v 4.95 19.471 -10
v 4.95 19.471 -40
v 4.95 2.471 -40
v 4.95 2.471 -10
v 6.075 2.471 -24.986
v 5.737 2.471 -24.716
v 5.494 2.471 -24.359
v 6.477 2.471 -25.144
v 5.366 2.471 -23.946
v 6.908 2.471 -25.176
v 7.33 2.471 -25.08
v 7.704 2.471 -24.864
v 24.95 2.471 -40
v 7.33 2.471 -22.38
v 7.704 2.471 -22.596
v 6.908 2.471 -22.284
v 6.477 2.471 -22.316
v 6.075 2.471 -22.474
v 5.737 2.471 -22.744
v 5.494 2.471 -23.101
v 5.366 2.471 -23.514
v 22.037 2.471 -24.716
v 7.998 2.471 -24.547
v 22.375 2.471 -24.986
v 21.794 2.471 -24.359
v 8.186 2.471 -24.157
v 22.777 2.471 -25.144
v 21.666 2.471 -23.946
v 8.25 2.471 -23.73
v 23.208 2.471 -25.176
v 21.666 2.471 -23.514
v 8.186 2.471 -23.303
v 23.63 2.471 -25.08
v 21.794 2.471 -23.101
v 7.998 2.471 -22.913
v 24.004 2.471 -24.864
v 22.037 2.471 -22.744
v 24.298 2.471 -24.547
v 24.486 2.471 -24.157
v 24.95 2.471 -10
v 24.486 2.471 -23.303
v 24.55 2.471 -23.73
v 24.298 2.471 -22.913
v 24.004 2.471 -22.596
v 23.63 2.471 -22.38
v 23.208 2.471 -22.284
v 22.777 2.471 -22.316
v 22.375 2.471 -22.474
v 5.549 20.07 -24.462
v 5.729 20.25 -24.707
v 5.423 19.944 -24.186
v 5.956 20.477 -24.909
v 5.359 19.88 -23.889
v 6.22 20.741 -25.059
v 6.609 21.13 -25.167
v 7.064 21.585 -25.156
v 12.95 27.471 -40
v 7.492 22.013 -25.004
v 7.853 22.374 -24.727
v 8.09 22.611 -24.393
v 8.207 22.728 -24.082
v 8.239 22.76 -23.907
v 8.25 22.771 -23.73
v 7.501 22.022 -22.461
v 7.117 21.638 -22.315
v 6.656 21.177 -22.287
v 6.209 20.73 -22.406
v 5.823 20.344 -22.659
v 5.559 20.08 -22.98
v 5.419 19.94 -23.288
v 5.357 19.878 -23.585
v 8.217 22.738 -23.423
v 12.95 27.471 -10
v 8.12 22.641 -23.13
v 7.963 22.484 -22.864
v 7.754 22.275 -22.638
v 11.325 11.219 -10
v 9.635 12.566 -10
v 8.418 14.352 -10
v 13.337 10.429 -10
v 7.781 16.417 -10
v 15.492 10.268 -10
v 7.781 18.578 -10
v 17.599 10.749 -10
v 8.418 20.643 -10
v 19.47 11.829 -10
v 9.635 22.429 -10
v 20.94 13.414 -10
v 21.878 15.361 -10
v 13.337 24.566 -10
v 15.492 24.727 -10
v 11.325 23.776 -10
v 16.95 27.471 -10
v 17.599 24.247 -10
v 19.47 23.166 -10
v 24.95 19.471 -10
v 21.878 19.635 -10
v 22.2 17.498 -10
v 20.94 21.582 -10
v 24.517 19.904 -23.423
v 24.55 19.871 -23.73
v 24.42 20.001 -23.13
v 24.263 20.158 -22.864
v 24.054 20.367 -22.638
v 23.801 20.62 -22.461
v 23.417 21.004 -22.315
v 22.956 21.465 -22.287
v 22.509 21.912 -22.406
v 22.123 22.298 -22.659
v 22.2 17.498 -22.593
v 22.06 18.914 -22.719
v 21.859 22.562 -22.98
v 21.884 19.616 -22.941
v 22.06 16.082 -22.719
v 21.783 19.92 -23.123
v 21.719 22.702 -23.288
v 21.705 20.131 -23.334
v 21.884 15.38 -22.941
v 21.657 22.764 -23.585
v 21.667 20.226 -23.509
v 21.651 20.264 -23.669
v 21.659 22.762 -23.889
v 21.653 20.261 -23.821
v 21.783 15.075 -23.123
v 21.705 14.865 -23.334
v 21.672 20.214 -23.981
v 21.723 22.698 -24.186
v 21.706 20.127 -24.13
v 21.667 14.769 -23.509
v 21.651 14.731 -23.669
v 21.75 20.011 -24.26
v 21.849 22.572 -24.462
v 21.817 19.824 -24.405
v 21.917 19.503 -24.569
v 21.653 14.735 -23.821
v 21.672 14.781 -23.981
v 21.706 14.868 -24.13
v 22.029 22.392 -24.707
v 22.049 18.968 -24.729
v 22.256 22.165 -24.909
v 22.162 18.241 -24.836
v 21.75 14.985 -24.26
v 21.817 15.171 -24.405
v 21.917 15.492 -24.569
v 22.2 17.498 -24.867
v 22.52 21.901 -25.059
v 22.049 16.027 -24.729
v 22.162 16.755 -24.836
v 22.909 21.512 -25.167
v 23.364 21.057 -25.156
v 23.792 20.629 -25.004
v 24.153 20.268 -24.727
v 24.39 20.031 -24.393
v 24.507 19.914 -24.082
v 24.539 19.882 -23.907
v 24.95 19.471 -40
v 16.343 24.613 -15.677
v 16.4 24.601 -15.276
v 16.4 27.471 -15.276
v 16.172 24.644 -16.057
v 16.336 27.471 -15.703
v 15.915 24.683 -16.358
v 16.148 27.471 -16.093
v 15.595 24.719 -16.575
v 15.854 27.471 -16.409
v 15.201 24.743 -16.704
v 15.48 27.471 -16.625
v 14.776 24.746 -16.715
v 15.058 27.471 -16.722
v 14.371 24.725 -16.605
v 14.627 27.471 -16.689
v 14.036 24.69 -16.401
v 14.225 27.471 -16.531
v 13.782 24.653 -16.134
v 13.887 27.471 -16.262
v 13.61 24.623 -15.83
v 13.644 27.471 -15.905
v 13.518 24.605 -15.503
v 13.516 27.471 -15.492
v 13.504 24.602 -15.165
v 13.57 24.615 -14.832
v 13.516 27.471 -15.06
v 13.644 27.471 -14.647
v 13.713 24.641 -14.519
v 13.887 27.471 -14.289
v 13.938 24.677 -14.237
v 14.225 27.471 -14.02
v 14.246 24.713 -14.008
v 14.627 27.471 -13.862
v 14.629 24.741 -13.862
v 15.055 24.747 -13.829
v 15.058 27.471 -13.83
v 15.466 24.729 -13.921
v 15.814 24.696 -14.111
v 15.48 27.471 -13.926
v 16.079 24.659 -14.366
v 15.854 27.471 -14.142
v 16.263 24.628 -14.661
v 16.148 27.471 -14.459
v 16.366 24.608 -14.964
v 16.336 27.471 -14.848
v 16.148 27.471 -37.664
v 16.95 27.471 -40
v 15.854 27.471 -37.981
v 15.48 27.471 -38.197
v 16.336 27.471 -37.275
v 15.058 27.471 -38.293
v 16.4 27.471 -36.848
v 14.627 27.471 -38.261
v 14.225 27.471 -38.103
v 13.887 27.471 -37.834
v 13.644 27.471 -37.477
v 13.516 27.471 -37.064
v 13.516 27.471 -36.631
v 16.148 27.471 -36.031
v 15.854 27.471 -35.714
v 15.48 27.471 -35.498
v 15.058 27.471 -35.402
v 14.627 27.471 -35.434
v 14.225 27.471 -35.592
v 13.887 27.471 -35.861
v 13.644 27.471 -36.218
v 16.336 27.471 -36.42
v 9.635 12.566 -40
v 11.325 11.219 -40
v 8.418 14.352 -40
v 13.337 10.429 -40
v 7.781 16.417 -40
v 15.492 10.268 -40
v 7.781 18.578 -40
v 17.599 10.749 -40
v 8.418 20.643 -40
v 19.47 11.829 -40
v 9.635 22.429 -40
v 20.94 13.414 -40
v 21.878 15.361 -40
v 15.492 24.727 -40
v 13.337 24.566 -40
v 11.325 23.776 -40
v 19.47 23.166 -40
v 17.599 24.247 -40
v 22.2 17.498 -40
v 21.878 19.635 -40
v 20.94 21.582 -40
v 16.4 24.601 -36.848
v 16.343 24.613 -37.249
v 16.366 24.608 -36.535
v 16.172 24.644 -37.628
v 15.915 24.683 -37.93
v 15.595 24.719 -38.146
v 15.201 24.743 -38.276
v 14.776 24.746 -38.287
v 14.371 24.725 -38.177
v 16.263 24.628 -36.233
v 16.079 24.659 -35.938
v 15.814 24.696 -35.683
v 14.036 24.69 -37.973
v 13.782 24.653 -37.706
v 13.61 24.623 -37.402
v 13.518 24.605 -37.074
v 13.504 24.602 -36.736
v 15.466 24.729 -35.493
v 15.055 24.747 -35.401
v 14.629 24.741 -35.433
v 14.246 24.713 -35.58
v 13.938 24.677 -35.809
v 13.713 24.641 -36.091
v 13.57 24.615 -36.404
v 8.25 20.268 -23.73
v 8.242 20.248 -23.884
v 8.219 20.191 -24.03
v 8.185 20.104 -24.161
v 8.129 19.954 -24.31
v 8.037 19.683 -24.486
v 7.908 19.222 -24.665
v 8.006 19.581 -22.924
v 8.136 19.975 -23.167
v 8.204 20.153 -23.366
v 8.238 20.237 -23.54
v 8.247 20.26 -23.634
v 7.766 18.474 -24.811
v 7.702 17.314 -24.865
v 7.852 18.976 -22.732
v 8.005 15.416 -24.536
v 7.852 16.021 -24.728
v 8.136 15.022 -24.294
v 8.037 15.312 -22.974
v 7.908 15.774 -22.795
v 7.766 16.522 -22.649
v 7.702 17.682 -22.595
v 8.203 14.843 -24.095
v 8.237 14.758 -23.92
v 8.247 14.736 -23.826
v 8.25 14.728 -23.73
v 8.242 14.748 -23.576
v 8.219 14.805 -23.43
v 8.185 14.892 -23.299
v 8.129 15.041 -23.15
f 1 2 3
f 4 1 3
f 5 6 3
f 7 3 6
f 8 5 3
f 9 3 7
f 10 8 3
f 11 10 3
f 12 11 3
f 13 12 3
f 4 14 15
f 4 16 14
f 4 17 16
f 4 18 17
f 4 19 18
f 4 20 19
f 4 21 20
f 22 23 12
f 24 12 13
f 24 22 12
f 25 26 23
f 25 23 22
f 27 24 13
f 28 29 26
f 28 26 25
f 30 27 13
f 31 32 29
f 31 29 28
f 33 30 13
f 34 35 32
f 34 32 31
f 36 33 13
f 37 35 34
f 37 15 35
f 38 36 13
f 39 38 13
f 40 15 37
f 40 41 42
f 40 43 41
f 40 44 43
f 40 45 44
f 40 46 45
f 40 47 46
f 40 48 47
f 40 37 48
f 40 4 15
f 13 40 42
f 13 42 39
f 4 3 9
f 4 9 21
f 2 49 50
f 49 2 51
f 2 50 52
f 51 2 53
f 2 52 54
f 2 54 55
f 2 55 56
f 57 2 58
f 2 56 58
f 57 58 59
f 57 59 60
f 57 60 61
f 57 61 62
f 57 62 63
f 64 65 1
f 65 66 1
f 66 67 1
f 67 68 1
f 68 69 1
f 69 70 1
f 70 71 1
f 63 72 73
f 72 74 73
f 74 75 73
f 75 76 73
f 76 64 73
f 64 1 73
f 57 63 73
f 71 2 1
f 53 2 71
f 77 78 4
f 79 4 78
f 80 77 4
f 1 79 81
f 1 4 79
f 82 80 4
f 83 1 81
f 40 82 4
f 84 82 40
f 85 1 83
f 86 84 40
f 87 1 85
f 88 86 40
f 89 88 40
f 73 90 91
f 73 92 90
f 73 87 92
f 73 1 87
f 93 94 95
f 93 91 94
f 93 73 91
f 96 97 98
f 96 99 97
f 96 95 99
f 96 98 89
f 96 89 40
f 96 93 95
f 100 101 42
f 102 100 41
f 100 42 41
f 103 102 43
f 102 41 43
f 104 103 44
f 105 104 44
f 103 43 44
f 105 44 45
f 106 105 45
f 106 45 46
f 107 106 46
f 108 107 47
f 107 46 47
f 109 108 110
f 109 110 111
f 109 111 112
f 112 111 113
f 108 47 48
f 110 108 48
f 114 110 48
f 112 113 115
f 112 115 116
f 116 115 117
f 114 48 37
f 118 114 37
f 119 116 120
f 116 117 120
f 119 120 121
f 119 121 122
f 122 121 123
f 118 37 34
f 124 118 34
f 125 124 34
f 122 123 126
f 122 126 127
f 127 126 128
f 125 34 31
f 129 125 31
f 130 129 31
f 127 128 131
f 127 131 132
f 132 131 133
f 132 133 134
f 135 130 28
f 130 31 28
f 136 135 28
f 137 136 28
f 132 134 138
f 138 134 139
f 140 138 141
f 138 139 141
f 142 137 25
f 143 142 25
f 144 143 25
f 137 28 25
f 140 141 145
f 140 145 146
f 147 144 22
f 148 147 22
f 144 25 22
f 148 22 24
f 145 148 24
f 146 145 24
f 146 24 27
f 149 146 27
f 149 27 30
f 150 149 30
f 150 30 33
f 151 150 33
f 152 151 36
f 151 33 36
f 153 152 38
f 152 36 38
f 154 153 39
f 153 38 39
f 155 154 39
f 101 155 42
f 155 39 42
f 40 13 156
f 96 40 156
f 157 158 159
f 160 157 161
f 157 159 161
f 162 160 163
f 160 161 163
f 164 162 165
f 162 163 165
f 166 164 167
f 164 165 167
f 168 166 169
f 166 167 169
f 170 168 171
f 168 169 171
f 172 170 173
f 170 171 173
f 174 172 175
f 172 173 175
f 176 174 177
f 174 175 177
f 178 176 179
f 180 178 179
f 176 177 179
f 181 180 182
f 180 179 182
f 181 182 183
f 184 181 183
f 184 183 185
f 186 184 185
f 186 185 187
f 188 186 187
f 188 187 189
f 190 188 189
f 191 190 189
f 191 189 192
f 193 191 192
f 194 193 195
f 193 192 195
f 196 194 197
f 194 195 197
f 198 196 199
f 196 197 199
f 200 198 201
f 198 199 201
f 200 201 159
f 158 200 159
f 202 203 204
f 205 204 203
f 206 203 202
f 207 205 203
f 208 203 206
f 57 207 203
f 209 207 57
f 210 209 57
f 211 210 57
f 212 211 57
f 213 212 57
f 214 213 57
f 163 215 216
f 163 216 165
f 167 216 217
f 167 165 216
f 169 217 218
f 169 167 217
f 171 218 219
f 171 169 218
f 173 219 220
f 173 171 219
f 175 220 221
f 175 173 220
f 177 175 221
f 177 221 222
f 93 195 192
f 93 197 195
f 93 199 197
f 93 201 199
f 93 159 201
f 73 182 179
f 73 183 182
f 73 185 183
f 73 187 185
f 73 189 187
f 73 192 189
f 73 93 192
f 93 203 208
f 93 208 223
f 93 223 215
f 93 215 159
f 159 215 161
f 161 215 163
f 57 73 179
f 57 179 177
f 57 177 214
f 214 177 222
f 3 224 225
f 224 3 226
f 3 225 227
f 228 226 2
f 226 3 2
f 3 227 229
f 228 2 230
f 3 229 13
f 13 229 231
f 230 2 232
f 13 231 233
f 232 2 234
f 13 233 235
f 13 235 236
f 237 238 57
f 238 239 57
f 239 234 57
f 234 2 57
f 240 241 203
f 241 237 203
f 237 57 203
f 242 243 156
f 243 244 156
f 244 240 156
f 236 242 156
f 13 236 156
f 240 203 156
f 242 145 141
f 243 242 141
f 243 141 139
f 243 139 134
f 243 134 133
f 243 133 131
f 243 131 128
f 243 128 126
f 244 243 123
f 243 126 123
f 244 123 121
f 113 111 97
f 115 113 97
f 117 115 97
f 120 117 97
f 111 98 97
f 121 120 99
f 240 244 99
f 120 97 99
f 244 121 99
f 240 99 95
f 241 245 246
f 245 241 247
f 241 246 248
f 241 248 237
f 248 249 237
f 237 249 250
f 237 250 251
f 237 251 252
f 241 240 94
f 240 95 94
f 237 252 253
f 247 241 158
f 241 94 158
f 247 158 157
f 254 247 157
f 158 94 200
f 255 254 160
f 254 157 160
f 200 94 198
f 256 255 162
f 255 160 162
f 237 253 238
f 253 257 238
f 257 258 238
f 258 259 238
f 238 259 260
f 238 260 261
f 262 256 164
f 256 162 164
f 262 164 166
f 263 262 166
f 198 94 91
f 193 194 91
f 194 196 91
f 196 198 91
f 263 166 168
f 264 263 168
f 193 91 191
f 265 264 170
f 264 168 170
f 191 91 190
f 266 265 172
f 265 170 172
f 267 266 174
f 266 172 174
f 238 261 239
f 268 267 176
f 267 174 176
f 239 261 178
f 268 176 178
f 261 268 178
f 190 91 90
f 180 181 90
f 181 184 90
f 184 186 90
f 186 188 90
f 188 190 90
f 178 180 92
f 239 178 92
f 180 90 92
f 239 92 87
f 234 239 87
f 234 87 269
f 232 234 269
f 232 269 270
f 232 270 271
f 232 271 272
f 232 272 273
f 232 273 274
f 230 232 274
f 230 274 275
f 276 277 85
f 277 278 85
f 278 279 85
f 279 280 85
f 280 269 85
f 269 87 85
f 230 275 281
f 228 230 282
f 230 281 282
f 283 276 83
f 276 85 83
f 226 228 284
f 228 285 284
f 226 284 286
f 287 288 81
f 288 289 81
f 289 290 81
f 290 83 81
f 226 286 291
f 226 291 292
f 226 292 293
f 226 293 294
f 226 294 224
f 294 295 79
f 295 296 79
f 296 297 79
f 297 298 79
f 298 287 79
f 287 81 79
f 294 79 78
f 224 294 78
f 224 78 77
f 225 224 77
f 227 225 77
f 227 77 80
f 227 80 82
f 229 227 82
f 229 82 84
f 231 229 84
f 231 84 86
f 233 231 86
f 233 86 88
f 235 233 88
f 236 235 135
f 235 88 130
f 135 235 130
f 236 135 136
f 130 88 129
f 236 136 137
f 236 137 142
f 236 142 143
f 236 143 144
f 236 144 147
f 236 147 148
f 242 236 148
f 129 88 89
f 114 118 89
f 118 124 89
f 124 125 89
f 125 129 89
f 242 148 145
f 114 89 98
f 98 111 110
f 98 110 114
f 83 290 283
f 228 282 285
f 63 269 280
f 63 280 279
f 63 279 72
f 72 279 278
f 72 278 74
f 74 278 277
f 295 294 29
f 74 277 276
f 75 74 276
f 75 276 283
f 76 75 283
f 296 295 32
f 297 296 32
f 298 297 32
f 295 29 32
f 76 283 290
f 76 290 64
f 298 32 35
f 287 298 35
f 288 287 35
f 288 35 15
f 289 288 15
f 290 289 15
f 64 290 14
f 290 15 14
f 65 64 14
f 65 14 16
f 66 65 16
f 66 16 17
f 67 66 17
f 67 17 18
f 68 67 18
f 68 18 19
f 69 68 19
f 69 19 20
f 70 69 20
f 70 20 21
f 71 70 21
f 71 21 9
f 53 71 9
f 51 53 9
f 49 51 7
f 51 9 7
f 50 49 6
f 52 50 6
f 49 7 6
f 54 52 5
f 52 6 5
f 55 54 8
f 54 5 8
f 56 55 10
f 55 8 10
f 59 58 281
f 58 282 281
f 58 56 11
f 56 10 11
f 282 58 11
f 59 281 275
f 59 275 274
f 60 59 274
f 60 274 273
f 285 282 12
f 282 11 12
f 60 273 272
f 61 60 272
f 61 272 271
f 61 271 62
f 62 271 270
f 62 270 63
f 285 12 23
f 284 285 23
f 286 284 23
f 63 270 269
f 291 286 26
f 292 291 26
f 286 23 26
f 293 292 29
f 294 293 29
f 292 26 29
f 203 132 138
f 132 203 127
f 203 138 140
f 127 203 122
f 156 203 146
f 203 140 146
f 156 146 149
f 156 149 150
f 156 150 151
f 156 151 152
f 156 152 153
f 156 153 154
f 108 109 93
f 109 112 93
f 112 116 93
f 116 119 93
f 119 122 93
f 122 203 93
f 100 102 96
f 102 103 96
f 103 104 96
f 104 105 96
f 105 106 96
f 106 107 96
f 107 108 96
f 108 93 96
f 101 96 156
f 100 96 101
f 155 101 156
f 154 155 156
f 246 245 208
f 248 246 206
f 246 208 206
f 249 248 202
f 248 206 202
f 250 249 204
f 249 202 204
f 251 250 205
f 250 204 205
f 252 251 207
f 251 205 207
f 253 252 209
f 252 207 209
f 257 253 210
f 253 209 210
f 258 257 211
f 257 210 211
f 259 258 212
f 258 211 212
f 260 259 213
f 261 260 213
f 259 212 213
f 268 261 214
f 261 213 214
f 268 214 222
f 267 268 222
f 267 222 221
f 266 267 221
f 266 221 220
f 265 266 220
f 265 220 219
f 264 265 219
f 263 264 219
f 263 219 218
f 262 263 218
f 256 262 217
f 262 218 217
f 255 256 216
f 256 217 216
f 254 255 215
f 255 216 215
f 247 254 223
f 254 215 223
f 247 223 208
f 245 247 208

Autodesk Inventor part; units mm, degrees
ref_plane "YZ Plane" through (0, 0, 0) normal (1, 0, 0) x (0, 1, 0)
ref_plane "XZ Plane" through (0, 0, 0) normal (0, 1, 0) x (-1, 0, 0)
ref_plane "XY Plane" through (0, 0, 0) normal (0, 0, 1) x (1, 0, 0)
ref_plane "Work Plane1" through (0, 0, 0) normal (0, 0, 1) x (1, 0, 0)
ref_plane "Work Plane2" through (0, 0, -10) normal (0, 0, 1) x (1, 0, 0)
sketch "Sketch1" plane through (0, 0, -10) normal (0, 0, 1) x (1, 0, 0)
  circle A0 centre (14.95, 17.4977) radius 7.15 projected
  line L0 (0, 2.471) -> (29.9, 2.471) projected
  line L1 (0, 2.471) -> (0, 18.471) projected
  line L2 (0, 18.471) -> (-2, 18.471) projected
  line L3 (-2, 18.471) -> (-2, -1.5) projected
  line L4 (29.9, -1.5) -> (-2, -1.5) projected
  line L5 (29.9, -1.5) -> (29.9, 2.471) projected
  line L6 (4.95, 2.471) -> (24.95, 2.471)
  line L7 (24.95, 2.471) -> (24.95, 27.471)
  line L8 (24.95, 27.471) -> (4.95, 27.471)
  line L9 (4.95, 27.471) -> (4.95, 2.471)
  circle A1 centre (14.95, 17.4977) radius 7.25
  point P0 (0, 0)
  dimension "d6" = 20
  dimension "d7" = 25
  dimension "d8" = 10
  dimension "d9" = 0.1
extrude "Extrusion1" add sketch "Sketch1" against normal blind 30 contours L9 L8 L7 L0
sketch "Sketch2" plane through (4.95, 2.471, -10) normal (0, -1, 0) x (1, 0, 0)
  circle A0 centre (18.15, -13.73) radius 2.45 projected
  circle A1 centre (1.85, -13.73) radius 2.75 projected
  circle A2 centre (18.15, -13.73) radius 1.45
  circle A3 centre (1.85, -13.73) radius 1.45
  point P0 (-4.95, 10)
  dimension "d10" = 2.9
  dimension "d11" = 2.9
extrude "Extrusion2" cut sketch "Sketch2" against normal through all contours A2 | A3
chamfer "Chamfer1" distance 8 angle 45 2 edges at (24.95, 27.471, -25) (4.95, 27.471, -25)
sketch "Sketch3" plane through (12.95, 27.471, -10) normal (0, 1, 0) x (1, 0, 0)
  line L0 (0, 0) -> (0, 30) projected
  line L1 (4, 0) -> (0, 0) projected
  line L2 (4, 30) -> (4, 0) projected
  line L3 (0, 30) -> (4, 30) projected
  circle A0 centre (2, 5.2757) radius 1.45
  circle A1 centre (2, 26.8475) radius 1.45
  point P0 (-12.95, -10)
  dimension "d17" = 2.9
  dimension "d18" = 2.9
extrude "Extrusion3" cut sketch "Sketch3" against normal blind 10 contours A0 | A1
ref_plane "Work Plane3" through (0, 27.471, -10) normal (0, -0.7071068, 0.7071068) x (1, 0, 0)
ref_plane "Work Plane4" through (12.95, 27.471, -10) normal (0, 0.7071068, 0.7071068) x (1, 0, 0)
ref_plane "Work Plane5" through (14.95, 2.471, -10) normal (1, 0, 0) x (0, 0, -1)
sketch "Sketch5" plane through (14.95, 2.471, -10) normal (1, 0, 0) x (0, 0, -1)
  line L0 (0, 22.2768) -> (30, 22.2768) projected
  line L1 (0, 7.7768) -> (30, 7.7768) projected
  line L2 (0, 22.2768) -> (-4.2183, 22.2768)
  line L3 (-4.2183, 22.2768) -> (24.7731, 51.2681)
  line L4 (24.7731, 51.2681) -> (24.7731, 22.2768)
  point P0 (-10, -2.471)
  dimension "d21" = 41
  dimension "d22" = 45
properties part number "cellSTORM_v5_greenlaser_adapter"
